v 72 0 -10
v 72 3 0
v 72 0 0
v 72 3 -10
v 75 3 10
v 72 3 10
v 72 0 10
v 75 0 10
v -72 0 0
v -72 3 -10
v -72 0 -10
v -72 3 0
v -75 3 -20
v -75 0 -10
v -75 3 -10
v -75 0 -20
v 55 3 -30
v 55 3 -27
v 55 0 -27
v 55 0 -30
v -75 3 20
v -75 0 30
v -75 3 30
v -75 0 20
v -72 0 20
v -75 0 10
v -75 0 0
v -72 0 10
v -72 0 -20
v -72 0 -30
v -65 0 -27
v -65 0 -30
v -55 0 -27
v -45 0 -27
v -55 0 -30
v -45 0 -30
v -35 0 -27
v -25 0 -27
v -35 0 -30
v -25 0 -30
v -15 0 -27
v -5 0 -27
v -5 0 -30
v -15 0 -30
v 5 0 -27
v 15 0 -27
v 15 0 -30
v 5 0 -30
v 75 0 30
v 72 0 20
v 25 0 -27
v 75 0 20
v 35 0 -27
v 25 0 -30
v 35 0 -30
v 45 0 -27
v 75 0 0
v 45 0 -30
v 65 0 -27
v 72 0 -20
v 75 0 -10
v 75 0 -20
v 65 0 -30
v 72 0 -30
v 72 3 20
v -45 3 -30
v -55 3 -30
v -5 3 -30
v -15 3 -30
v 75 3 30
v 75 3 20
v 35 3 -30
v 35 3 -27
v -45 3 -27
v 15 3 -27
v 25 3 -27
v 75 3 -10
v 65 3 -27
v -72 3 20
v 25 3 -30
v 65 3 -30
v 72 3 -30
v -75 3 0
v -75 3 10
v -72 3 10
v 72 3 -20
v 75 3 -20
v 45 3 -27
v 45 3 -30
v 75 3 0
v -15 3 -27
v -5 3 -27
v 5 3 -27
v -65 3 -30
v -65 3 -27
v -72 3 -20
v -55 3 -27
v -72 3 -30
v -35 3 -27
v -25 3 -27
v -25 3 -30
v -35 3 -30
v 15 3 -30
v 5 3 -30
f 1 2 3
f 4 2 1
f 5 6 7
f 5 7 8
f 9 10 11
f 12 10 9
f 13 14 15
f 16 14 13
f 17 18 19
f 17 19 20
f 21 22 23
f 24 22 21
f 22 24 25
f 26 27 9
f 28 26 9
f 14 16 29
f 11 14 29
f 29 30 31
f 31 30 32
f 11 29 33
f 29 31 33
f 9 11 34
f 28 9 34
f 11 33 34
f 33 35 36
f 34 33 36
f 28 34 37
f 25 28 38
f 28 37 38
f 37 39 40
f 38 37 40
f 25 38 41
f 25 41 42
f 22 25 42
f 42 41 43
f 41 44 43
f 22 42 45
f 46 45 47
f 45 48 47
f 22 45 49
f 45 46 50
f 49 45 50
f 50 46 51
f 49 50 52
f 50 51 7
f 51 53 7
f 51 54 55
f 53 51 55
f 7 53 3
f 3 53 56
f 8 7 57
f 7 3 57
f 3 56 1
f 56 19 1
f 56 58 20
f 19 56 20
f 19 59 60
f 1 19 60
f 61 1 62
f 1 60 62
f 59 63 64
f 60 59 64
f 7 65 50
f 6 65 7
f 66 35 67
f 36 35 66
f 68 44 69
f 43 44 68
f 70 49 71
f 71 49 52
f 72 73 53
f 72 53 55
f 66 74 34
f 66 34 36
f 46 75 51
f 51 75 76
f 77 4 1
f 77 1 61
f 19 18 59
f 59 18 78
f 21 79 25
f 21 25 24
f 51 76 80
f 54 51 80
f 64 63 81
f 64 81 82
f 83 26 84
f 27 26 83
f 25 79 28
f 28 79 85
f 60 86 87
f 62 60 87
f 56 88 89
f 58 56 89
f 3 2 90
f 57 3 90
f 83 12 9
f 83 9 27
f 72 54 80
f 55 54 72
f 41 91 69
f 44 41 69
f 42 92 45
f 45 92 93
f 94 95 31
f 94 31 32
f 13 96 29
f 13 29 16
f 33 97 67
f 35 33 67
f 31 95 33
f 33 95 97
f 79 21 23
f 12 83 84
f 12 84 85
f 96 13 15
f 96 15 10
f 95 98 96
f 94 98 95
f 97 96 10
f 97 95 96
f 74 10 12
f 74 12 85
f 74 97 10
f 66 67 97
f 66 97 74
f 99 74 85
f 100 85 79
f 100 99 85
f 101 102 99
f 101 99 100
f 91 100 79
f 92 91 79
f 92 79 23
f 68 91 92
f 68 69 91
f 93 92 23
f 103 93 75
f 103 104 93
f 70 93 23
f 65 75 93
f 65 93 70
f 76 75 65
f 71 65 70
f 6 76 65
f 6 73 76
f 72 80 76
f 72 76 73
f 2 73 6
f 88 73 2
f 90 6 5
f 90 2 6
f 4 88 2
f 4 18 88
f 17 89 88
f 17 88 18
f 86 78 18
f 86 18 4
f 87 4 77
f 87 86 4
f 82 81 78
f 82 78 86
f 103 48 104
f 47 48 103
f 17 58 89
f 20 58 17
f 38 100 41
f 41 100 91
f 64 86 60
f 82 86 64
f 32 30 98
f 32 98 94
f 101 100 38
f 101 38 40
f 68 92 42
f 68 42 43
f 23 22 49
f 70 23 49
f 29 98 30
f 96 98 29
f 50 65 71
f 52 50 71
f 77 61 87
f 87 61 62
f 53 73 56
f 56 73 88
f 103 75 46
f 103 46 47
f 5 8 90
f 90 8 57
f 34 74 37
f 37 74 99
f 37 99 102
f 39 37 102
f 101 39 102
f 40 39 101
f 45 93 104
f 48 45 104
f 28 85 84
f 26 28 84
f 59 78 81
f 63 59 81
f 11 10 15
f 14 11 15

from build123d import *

# Parameters (mm, degrees)
SKETCH1_W               = 150
SKETCH1_H               = 60
BOSS_EXTRUDE1_DEPTH     = 3
SKETCH2_W               = 3
SKETCH2_H               = 10
CUT_EXTRUDE1_DEPTH      = 81.833161512
LPATTERN1_COUNT         = 3
LPATTERN1_PITCH         = 20
MIRROR1_COPY_1_SKETCH_W = 3
MIRROR1_COPY_1_SKETCH_H = 10
MIRROR1_COPY_1_DEPTH    = 81.833161512
MIRROR1_COPY_2_SKETCH_W = 3
MIRROR1_COPY_2_SKETCH_H = 10
MIRROR1_COPY_2_DEPTH    = 81.833161512
SKETCH3_W               = 10
SKETCH3_H               = 3
CUT_EXTRUDE2_DEPTH      = 81.833161512
LPATTERN2_COUNT         = 7
LPATTERN2_PITCH         = 20


with BuildPart() as part:
    # Sketch1 → Boss-Extrude1 (new body)
    with BuildSketch(Plane(origin=(0, 0, 0), x_dir=(1, 0, 0), z_dir=(0, 1, 0))):
        Rectangle(SKETCH1_W, SKETCH1_H)
    extrude(amount=BOSS_EXTRUDE1_DEPTH)

    # Sketch2 → Cut-Extrude1 (cut, through all)
    with BuildSketch(Plane(origin=(0, 3, 0), x_dir=(1, 0, 0), z_dir=(0, 1, 0))):
        with Locations((73.5, -15)):
            Rectangle(SKETCH2_W, SKETCH2_H)
    cut_extrude1 = extrude(amount=-CUT_EXTRUDE1_DEPTH, mode=Mode.SUBTRACT)

    # LPattern1: Cut-Extrude1 ×3
    with Locations(*[(0, 0, -i * LPATTERN1_PITCH) for i in range(1, LPATTERN1_COUNT)]):
        add(cut_extrude1, mode=Mode.SUBTRACT)

    # Mirror1: Cut-Extrude1 across plane
    add(cut_extrude1.mirror(Plane(origin=(0, 0, 0), x_dir=(0, 0, 1), z_dir=(1, 0, 0))), mode=Mode.SUBTRACT)

    # Mirror1 copy 1 sketch → Mirror1 copy 1 (cut, through all)
    with BuildSketch(Plane(origin=(0, 3, -20), x_dir=(-1, 0, 0), z_dir=(0, 1, 0))):
        with Locations((73.5, 15)):
            Rectangle(MIRROR1_COPY_1_SKETCH_W, MIRROR1_COPY_1_SKETCH_H)
    extrude(amount=-MIRROR1_COPY_1_DEPTH, mode=Mode.SUBTRACT)

    # Mirror1 copy 2 sketch → Mirror1 copy 2 (cut, through all)
    with BuildSketch(Plane(origin=(0, 3, -40), x_dir=(-1, 0, 0), z_dir=(0, 1, 0))):
        with Locations((73.5, 15)):
            Rectangle(MIRROR1_COPY_2_SKETCH_W, MIRROR1_COPY_2_SKETCH_H)
    extrude(amount=-MIRROR1_COPY_2_DEPTH, mode=Mode.SUBTRACT)

    # Sketch3 → Cut-Extrude2 (cut, through all)
    with BuildSketch(Plane(origin=(0, 3, 0), x_dir=(1, 0, 0), z_dir=(0, 1, 0))):
        with Locations((-60, 28.5)):
            Rectangle(SKETCH3_W, SKETCH3_H)
    cut_extrude2 = extrude(amount=-CUT_EXTRUDE2_DEPTH, mode=Mode.SUBTRACT)

    # LPattern2: Cut-Extrude2 ×7
    with Locations(*[(i * LPATTERN2_PITCH, 0, 0) for i in range(1, LPATTERN2_COUNT)]):
        add(cut_extrude2, mode=Mode.SUBTRACT)


solid = part.part
